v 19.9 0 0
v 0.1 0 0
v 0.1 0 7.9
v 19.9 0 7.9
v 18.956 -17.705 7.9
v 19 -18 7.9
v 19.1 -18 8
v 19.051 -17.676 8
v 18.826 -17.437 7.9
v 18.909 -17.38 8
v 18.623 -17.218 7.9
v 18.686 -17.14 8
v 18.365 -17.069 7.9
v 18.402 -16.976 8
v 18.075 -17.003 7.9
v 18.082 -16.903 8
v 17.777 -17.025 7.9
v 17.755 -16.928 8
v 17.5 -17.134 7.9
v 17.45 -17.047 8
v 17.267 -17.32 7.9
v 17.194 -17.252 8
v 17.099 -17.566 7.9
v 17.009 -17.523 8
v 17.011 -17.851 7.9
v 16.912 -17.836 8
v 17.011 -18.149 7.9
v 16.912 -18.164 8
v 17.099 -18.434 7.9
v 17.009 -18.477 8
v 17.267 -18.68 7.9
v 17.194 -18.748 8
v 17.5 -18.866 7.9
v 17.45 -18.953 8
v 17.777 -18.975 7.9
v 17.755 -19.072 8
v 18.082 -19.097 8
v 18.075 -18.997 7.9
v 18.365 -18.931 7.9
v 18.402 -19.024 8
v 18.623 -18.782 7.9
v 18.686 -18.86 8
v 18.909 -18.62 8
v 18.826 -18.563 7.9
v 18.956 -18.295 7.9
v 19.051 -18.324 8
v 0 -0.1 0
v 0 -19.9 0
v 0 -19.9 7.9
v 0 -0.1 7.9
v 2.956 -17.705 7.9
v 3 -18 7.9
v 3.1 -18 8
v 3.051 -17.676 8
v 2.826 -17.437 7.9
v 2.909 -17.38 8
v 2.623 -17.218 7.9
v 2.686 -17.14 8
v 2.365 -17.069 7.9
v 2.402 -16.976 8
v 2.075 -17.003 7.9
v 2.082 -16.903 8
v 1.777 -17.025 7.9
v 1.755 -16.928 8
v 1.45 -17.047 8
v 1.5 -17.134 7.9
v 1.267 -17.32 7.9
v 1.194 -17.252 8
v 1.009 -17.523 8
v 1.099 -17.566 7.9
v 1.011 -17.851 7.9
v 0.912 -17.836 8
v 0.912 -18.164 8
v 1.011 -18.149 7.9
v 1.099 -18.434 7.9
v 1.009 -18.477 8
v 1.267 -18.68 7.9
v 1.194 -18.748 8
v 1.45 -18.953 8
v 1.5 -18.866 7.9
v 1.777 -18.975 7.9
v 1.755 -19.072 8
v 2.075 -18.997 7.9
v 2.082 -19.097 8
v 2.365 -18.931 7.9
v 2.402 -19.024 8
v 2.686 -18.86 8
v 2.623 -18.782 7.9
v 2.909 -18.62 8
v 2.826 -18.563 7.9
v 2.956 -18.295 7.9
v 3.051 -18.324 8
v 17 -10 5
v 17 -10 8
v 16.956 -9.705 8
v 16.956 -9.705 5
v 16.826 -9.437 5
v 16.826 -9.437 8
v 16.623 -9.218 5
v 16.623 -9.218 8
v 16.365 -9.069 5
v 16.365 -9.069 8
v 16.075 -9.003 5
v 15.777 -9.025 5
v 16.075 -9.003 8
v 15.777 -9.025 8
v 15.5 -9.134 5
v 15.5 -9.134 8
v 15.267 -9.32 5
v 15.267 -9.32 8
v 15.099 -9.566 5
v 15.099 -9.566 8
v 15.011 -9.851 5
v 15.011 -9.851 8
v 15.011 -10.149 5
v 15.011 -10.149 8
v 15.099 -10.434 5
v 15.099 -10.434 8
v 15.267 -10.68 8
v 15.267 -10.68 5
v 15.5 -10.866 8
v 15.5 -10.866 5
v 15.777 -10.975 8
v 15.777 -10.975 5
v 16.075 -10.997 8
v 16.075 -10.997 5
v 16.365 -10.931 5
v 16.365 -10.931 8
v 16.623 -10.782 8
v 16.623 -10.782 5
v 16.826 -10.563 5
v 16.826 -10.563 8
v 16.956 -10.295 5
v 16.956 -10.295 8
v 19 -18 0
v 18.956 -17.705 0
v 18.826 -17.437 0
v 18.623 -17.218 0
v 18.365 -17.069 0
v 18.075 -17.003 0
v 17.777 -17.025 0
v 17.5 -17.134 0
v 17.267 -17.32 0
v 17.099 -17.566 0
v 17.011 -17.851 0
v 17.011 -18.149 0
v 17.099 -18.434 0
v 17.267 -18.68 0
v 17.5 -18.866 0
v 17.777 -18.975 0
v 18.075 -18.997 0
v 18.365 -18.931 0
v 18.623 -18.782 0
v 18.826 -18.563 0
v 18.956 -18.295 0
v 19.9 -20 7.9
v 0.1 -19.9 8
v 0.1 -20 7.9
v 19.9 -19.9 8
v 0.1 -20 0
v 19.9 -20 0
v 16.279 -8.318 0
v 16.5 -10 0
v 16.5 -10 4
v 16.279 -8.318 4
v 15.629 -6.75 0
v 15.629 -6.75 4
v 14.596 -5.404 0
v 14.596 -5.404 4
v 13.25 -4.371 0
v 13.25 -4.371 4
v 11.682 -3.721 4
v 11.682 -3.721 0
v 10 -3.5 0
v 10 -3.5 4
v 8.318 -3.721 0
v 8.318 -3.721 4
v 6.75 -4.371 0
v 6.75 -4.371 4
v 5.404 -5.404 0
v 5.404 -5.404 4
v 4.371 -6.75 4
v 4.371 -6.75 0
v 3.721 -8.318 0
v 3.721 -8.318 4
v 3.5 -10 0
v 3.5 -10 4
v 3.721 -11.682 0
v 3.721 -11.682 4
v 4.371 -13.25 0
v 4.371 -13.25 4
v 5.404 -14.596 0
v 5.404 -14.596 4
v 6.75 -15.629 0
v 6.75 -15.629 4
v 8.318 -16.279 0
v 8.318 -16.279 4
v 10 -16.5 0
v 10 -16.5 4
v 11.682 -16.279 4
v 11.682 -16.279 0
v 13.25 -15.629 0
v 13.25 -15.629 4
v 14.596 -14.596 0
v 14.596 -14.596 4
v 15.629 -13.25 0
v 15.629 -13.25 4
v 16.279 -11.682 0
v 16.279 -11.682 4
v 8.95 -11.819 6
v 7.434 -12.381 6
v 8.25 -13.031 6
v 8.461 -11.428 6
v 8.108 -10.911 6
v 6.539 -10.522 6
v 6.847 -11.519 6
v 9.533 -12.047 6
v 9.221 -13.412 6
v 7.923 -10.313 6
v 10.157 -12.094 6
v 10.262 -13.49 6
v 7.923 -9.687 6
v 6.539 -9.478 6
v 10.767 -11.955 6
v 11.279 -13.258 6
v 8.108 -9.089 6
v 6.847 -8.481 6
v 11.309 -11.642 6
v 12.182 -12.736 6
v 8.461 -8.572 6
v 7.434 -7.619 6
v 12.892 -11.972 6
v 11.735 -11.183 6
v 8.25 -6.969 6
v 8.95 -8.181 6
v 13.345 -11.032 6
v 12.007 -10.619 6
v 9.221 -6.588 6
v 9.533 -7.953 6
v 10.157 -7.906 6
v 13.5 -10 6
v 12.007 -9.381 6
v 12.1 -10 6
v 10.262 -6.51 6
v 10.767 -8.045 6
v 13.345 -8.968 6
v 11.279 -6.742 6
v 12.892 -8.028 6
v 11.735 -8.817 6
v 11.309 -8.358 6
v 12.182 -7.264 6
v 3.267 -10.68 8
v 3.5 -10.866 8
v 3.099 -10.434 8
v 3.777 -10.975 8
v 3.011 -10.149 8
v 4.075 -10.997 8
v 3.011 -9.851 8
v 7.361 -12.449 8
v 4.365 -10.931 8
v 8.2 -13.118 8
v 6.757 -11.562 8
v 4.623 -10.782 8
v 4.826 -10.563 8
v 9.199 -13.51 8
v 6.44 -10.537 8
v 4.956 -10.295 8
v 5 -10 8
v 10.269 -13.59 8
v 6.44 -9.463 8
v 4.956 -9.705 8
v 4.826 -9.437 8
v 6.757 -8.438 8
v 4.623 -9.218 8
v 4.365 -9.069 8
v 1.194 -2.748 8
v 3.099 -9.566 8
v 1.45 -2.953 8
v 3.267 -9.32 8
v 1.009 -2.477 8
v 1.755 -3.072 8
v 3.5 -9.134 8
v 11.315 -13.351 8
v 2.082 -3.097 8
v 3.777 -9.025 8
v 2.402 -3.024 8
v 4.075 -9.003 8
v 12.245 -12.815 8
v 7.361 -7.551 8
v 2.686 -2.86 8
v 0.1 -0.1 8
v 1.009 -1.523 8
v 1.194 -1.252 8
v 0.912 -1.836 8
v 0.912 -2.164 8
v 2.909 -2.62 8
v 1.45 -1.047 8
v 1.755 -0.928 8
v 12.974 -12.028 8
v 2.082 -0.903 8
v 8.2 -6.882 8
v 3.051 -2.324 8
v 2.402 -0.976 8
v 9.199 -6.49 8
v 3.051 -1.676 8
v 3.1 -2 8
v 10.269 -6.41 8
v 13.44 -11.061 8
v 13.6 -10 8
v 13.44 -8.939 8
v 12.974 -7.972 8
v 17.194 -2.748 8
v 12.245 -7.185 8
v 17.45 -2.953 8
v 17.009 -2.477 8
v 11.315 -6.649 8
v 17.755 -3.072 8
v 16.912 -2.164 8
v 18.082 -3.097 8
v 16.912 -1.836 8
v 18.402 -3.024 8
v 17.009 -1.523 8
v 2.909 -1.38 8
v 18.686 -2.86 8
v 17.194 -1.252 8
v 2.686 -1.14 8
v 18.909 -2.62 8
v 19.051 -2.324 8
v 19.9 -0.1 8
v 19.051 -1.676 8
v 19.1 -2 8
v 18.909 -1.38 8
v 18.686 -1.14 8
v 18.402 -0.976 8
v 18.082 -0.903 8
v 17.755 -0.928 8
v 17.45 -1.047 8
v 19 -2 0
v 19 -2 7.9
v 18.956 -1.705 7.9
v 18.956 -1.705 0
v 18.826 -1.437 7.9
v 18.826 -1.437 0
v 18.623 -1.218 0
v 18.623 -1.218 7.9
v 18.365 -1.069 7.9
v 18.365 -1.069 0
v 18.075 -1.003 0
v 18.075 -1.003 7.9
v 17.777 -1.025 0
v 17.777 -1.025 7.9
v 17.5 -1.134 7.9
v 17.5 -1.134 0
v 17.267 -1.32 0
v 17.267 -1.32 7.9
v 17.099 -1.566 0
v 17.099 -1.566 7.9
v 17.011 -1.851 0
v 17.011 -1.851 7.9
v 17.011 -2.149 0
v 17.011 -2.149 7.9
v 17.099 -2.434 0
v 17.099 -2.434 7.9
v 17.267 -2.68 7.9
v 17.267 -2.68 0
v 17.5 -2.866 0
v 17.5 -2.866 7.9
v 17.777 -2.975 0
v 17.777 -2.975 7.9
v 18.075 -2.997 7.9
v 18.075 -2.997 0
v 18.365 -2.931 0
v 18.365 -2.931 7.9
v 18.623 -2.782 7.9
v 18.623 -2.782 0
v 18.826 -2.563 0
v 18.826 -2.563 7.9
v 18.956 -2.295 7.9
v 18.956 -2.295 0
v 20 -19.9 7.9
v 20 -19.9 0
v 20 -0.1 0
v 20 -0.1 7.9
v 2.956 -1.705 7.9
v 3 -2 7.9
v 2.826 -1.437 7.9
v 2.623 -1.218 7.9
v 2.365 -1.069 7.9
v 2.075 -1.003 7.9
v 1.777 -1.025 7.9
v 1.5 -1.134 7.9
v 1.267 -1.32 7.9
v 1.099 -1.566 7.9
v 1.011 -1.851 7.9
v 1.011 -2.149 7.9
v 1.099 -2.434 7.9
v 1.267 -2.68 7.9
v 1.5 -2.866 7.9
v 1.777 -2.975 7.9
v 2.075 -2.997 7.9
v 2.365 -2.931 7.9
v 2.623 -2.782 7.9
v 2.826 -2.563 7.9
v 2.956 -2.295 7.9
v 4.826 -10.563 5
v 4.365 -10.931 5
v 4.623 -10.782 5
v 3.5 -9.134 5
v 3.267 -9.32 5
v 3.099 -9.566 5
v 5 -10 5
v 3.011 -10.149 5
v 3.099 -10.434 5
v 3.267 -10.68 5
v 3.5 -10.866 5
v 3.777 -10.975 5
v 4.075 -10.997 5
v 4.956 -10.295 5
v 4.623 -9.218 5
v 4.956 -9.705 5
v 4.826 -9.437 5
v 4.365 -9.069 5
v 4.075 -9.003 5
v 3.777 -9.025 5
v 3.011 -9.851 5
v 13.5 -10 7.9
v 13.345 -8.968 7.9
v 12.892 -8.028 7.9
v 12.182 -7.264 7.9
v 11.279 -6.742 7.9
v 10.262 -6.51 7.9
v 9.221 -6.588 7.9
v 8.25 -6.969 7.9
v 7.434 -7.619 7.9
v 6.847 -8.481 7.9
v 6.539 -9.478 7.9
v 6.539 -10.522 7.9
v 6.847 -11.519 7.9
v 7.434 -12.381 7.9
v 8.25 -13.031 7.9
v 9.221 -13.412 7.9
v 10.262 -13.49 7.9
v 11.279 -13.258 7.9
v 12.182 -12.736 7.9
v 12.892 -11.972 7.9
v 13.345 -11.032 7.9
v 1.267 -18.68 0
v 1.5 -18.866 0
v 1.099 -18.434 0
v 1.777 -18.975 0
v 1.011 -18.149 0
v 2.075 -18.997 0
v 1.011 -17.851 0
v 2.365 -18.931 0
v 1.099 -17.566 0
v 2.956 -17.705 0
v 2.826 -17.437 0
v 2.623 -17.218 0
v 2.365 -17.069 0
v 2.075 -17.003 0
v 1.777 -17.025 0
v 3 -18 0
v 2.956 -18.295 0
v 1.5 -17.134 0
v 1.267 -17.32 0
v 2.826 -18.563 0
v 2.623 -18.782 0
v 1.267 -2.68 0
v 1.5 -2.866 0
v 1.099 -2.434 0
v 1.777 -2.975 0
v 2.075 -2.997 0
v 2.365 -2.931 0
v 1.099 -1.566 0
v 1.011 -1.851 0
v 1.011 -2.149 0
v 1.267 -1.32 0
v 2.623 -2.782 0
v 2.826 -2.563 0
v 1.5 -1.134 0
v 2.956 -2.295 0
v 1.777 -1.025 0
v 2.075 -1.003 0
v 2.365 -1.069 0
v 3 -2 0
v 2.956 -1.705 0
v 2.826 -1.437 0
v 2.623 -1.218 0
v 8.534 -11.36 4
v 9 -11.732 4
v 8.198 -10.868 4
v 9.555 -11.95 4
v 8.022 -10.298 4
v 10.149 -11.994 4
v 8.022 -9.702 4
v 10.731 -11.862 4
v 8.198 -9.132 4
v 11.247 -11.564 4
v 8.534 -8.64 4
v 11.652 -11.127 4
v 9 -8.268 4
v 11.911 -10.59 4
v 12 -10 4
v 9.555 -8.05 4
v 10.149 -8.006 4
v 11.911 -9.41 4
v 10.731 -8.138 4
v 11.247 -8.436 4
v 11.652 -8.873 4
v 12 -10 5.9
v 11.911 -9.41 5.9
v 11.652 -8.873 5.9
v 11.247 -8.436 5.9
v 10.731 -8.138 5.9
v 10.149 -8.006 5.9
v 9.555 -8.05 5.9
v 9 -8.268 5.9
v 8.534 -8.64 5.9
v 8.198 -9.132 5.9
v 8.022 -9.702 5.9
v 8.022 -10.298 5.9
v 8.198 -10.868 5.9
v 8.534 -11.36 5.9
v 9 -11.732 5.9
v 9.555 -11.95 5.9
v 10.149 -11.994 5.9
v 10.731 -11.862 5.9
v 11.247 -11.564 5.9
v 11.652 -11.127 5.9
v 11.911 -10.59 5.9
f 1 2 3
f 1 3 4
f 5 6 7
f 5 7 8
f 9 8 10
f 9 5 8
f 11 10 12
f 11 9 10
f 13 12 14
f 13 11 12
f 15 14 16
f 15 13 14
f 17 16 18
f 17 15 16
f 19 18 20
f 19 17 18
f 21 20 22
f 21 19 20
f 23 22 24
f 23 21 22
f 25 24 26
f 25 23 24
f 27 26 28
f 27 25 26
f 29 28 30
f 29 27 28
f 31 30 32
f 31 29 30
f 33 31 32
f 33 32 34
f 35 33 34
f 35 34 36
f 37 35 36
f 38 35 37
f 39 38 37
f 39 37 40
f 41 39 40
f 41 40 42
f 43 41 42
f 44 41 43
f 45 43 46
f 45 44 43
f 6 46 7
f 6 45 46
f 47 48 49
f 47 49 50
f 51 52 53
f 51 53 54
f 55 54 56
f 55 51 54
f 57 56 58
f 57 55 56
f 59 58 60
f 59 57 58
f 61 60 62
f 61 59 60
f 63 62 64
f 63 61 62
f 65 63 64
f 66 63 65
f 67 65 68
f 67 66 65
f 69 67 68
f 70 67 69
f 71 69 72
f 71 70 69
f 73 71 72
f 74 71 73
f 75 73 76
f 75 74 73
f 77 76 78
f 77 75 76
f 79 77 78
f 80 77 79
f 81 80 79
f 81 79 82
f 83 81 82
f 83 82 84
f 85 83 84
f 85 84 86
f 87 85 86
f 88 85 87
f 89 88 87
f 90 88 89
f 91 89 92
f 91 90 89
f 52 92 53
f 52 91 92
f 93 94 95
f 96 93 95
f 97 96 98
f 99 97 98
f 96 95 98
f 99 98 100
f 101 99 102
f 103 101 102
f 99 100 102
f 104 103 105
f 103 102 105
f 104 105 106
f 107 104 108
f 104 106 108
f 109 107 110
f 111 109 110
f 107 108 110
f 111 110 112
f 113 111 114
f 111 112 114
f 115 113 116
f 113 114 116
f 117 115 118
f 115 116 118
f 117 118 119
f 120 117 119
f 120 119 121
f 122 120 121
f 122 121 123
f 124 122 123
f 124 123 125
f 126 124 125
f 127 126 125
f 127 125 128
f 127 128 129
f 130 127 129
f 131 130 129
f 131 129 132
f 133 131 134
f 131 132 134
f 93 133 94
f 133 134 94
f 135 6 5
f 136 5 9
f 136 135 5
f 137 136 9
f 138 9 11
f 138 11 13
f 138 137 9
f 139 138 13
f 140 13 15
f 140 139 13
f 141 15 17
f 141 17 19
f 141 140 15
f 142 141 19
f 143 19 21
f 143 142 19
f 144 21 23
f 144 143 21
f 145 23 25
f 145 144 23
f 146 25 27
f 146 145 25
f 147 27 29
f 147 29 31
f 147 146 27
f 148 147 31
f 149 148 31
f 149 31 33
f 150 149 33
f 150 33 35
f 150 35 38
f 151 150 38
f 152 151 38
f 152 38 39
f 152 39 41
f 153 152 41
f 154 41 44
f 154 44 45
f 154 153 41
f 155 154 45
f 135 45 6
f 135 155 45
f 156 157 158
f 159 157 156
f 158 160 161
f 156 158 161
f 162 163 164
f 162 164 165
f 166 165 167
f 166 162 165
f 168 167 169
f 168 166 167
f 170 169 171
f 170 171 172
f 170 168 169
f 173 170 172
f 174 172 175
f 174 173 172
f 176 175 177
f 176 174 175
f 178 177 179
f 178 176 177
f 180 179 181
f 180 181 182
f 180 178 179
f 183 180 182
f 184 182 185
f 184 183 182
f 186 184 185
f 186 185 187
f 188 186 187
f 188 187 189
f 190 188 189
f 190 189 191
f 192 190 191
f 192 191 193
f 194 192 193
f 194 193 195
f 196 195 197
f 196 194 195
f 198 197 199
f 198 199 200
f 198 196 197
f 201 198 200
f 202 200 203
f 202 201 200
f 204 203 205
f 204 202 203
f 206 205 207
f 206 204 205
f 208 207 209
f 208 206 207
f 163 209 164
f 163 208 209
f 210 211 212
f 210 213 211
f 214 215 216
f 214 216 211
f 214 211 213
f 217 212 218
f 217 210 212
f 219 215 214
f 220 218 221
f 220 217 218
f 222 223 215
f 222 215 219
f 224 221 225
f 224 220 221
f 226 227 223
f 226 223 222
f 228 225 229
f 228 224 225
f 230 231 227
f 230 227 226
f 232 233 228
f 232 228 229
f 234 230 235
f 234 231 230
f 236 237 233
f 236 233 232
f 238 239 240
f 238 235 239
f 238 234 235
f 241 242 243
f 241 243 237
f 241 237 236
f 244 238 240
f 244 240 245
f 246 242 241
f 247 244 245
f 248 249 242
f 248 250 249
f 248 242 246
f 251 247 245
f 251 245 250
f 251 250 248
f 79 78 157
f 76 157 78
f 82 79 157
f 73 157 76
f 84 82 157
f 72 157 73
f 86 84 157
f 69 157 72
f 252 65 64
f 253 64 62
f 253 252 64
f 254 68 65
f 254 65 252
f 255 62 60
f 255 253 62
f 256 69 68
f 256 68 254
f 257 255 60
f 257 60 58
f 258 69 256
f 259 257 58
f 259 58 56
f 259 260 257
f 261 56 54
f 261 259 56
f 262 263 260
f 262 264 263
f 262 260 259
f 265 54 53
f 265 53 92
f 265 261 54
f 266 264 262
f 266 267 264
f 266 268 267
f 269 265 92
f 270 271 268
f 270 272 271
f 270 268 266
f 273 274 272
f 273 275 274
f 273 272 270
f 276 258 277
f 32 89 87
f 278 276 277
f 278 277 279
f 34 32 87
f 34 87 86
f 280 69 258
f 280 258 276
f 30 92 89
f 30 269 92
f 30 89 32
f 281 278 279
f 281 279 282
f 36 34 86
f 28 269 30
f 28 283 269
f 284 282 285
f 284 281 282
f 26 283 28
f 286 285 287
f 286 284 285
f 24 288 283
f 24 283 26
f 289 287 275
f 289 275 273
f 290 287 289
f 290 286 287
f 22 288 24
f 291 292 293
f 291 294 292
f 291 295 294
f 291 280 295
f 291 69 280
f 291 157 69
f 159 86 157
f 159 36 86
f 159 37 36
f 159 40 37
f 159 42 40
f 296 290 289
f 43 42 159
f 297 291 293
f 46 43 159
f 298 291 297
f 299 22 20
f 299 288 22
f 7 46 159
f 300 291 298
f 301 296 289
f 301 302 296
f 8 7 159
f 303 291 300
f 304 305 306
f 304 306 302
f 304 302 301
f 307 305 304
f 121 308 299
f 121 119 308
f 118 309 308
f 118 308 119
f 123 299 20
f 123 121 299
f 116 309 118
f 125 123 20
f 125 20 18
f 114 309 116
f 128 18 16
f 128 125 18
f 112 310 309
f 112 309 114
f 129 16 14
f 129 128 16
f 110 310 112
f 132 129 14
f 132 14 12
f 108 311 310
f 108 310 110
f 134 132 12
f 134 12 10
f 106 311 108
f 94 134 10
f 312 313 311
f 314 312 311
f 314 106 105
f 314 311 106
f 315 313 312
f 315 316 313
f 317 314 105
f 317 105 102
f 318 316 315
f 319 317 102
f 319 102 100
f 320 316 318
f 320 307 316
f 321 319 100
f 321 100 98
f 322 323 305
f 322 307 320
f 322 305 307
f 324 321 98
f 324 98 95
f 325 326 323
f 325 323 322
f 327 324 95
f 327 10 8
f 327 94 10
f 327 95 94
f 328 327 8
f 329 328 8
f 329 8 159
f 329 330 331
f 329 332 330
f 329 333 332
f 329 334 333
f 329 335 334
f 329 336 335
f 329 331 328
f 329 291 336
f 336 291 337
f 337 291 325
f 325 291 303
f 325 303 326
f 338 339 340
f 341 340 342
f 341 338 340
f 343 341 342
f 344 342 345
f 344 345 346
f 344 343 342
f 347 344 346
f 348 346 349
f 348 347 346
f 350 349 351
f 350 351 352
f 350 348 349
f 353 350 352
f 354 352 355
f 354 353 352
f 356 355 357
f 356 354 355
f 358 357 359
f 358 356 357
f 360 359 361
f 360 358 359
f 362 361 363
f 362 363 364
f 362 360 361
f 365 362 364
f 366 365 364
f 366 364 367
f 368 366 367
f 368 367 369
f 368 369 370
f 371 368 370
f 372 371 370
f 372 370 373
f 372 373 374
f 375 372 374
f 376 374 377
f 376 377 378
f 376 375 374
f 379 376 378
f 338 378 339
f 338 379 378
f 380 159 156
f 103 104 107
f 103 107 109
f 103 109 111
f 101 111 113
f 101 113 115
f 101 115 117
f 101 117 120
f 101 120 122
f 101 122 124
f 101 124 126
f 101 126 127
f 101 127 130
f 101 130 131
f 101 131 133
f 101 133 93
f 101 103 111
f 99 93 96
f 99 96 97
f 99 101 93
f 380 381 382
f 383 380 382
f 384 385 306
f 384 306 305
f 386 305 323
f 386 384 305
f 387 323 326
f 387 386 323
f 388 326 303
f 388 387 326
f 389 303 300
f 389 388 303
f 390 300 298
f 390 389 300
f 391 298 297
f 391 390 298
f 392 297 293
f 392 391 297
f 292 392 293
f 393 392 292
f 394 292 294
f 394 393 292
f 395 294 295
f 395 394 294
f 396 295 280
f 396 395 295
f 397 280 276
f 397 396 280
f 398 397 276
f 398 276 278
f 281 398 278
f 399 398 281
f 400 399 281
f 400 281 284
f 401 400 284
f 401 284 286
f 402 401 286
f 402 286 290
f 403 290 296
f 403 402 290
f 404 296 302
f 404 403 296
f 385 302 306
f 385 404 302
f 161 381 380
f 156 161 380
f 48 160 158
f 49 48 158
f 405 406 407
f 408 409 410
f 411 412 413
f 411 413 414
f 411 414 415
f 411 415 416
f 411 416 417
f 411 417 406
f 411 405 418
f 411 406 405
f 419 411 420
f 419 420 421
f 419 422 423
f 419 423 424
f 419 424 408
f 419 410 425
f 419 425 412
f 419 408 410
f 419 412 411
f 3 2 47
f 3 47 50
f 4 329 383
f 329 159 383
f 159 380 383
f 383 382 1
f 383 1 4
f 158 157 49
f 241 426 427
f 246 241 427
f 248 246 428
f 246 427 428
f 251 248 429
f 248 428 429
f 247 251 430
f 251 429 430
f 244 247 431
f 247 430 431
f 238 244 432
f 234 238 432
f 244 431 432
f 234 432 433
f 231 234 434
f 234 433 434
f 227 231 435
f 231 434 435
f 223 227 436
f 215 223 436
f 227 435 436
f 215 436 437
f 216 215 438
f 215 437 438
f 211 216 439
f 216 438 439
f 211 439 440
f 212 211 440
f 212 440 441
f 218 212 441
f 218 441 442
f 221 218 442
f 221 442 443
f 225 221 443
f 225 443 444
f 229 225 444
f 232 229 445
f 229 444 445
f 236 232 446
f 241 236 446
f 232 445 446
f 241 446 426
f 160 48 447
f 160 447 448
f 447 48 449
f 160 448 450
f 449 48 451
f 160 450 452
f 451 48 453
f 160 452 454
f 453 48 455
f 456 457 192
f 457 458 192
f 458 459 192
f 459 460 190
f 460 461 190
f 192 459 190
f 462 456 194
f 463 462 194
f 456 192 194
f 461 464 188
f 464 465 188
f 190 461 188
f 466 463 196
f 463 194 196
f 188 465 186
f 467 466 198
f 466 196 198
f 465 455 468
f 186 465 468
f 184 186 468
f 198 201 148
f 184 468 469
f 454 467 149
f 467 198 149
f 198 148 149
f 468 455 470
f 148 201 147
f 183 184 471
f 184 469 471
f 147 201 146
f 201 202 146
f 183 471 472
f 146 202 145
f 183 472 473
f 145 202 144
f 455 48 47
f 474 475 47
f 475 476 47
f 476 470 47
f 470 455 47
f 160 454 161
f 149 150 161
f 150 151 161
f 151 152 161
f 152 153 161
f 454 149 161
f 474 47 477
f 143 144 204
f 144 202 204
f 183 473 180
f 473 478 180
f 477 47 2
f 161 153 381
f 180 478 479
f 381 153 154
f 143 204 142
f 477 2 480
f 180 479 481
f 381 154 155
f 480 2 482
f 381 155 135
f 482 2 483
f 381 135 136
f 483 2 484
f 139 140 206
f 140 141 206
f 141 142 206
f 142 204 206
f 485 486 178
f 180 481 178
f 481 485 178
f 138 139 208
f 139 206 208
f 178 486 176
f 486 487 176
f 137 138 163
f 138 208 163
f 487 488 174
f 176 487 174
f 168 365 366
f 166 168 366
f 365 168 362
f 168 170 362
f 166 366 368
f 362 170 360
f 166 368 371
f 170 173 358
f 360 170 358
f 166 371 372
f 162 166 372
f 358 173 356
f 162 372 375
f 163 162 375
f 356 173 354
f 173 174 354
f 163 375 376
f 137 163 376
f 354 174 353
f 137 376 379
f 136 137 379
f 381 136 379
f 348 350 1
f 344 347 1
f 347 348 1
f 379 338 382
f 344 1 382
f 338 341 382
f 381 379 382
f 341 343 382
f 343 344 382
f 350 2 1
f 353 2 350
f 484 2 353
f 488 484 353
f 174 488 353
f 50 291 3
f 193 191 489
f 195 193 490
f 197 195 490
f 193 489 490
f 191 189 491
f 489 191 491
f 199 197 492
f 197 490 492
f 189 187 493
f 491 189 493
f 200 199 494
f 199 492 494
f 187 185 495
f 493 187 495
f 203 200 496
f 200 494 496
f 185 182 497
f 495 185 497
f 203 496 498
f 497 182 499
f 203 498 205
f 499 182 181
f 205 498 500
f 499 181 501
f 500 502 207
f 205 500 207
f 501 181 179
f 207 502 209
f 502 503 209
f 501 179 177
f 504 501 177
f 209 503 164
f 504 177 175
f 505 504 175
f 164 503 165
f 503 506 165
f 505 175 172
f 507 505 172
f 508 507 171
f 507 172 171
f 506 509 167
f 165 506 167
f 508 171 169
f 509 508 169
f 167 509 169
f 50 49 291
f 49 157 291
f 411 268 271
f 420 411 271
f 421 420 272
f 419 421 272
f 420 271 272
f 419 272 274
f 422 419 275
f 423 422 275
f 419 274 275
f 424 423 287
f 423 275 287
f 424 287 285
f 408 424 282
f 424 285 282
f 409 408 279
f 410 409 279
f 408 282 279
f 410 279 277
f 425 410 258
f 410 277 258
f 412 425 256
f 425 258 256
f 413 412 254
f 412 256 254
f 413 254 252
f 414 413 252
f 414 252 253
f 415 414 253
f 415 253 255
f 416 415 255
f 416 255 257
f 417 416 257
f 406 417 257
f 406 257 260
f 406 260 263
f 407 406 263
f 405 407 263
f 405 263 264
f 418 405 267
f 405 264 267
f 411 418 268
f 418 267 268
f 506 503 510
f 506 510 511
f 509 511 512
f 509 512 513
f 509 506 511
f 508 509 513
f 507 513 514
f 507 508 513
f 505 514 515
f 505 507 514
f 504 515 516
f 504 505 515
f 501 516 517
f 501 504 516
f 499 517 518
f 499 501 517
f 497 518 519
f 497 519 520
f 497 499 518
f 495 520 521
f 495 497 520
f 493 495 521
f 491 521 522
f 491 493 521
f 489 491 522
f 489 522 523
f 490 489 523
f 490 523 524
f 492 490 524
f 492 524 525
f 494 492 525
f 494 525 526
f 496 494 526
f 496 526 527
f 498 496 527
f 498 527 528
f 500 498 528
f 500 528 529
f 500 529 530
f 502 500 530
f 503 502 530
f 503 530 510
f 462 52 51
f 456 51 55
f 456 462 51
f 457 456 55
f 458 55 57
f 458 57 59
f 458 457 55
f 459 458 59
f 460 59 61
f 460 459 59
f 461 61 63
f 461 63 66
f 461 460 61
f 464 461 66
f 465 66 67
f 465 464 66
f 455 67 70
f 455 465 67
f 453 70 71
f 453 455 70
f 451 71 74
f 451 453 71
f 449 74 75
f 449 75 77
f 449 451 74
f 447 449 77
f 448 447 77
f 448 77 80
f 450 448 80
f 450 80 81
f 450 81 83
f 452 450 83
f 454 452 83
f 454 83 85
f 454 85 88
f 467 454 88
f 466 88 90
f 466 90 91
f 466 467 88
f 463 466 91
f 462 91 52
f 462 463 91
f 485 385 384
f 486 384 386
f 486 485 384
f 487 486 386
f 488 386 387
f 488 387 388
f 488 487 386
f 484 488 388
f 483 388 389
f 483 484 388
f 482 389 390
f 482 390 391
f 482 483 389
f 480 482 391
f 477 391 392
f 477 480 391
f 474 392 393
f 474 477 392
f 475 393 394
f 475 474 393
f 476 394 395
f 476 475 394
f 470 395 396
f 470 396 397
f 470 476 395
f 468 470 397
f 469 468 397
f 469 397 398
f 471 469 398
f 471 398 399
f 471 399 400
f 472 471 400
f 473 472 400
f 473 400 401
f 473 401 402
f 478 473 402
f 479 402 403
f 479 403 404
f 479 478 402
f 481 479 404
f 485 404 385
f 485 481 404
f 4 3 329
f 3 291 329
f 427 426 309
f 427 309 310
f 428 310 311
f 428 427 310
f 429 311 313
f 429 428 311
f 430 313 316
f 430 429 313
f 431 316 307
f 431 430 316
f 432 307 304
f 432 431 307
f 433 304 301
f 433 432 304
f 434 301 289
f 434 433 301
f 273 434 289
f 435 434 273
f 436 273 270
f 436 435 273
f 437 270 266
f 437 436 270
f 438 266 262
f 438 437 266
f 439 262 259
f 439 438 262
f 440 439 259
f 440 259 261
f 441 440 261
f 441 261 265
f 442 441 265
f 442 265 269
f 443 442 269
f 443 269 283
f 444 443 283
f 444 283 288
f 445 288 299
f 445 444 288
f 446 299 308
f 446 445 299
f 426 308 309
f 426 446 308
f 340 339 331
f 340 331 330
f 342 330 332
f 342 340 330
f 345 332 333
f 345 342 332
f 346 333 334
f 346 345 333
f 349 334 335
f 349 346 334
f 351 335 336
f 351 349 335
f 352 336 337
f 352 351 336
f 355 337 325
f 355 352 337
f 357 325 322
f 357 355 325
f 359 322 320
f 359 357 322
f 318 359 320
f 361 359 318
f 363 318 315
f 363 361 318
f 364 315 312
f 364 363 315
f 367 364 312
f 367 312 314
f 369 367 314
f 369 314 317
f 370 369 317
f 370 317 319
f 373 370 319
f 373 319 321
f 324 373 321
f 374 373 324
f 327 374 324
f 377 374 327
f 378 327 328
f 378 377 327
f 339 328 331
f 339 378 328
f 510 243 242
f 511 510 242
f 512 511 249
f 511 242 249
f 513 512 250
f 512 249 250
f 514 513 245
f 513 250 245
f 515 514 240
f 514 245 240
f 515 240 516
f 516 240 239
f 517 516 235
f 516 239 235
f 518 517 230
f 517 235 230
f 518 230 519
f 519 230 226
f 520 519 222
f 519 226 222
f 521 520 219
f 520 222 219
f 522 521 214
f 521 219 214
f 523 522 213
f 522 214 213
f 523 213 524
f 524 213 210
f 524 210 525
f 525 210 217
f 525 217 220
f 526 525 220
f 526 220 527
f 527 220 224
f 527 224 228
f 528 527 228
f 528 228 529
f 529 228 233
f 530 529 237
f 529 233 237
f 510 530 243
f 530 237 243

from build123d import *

# Parameters (mm, degrees)
F0_W     = 20
F0_H     = 20
F0_R     = 1
F0_R_2   = 8.5
F0_R_3   = 7
F0_R_4   = 6.5
F0_R_5   = 1.25
F0_R_6   = 2
F1_DEPTH = 8
F2_R     = 3.5
F2_R_2   = 2
F3_DEPTH = 2
F4_SIZE  = 0.1
F5_DEPTH = 4
F6_R     = 1
F7_DEPTH = 3


with BuildPart() as f1:
    # F0 (on Top) → F1 (new body)
    with BuildSketch(Plane.XY):
        with Locations((10, -10)):
            Rectangle(F0_W, F0_H)
        with Locations((2, -18)):
            Circle(F0_R, mode=Mode.SUBTRACT)
        with Locations((18, -18)):
            Circle(F0_R, mode=Mode.SUBTRACT)
        with Locations((2, -2)):
            Circle(F0_R, mode=Mode.SUBTRACT)
        with Locations((10, -10)):
            Circle(F0_R_2, mode=Mode.SUBTRACT)
        with Locations((18, -2)):
            Circle(F0_R, mode=Mode.SUBTRACT)
        with Locations((10, -10)):
            Circle(F0_R_2)
        with Locations((10, -10)):
            Circle(F0_R_3, mode=Mode.SUBTRACT)
        with Locations((10, -10)):
            Circle(F0_R_3)
        with Locations((10, -10)):
            Circle(F0_R_4, mode=Mode.SUBTRACT)
        with Locations((10, -10)):
            Circle(F0_R_4)
        with BuildLine():
            ThreePointArc((11.25, -14.25), (9.1161165153, -15.1338834682), (10.0000000233, -13))
            ThreePointArc((10.0000000233, -13), (10.8838834847, -13.3661165318), (11.25, -14.25))
        make_face(mode=Mode.SUBTRACT)
        with Locations((5.75, -10)):
            Circle(F0_R_5, mode=Mode.SUBTRACT)
        with BuildLine():
            ThreePointArc((10, -7), (12.1213203436, -7.8786796564), (13, -10))
            ThreePointArc((13, -10), (12.1213203518, -12.1213203353), (10.0000000233, -13))
            ThreePointArc((10.0000000233, -13), (7.8786796647, -12.1213203518), (7, -10))
            ThreePointArc((7, -10), (7.8786796564, -7.8786796564), (10, -7))
        make_face(mode=Mode.SUBTRACT)
        with BuildLine():
            ThreePointArc((15.5, -10), (14.25, -11.25), (13, -10))
            ThreePointArc((13, -10), (14.25, -8.75), (15.5, -10))
        make_face(mode=Mode.SUBTRACT)
        with BuildLine():
            ThreePointArc((11.25, -5.75), (10.8838834765, -6.6338834765), (10, -7))
            ThreePointArc((10, -7), (9.1161165235, -4.8661165235), (11.25, -5.75))
        make_face(mode=Mode.SUBTRACT)
        with BuildLine():
            ThreePointArc((10.0000000233, -13), (12.1213203518, -12.1213203353), (13, -10))
            ThreePointArc((13, -10), (12.1213203436, -7.8786796564), (10, -7))
            ThreePointArc((10, -7), (7.8786796564, -7.8786796564), (7, -10))
            ThreePointArc((7, -10), (7.8786796647, -12.1213203518), (10.0000000233, -13))
        make_face()
        with Locations((10, -10)):
            Circle(F0_R_6, mode=Mode.SUBTRACT)
        with BuildLine():
            ThreePointArc((15.5, -10), (14.25, -8.75), (13, -10))
            ThreePointArc((13, -10), (14.25, -11.25), (15.5, -10))
        make_face()
        with BuildLine():
            ThreePointArc((11.25, -5.75), (9.1161165235, -4.8661165235), (10, -7))
            ThreePointArc((10, -7), (10.8838834765, -6.6338834765), (11.25, -5.75))
        make_face()
        with Locations((5.75, -10)):
            Circle(F0_R_5)
        with BuildLine():
            ThreePointArc((11.25, -14.25), (10.8838834847, -13.3661165318), (10.0000000233, -13))
            ThreePointArc((10.0000000233, -13), (9.1161165153, -15.1338834682), (11.25, -14.25))
        make_face()
    extrude(amount=F1_DEPTH)

    # F2 (on face) → F3 (cut)
    with BuildSketch(Plane.XY.offset(8)):
        with Locations((10, -10)):
            Circle(F2_R)
        with Locations((10, -10)):
            Circle(F2_R_2, mode=Mode.SUBTRACT)
    extrude(amount=-F3_DEPTH, mode=Mode.SUBTRACT)

    # F4
    f4_edges = [f1.edges().sort_by_distance(p)[0] for p in [
        (10, 0, 8),
        (20, -10, 8),
        (0, -10, 8),
        (10, -20, 8),
        (1, -18, 8),
        (17, -18, 8),
        (1, -2, 8),
        (6.5, -10, 8),
        (17, -2, 8),
        (20, -20, 4),
        (20, 0, 4),
        (0, -20, 4),
        (0, 0, 4),
        (8, -10, 6),
    ]]
    chamfer(f4_edges, length=F4_SIZE)

    # F0 (on Top) → F5 (cut)
    with BuildSketch(Plane.XY):
        with Locations((10, -10)):
            Circle(F0_R_4)
        with BuildLine():
            ThreePointArc((11.25, -14.25), (9.1161165153, -15.1338834682), (10.0000000233, -13))
            ThreePointArc((10.0000000233, -13), (10.8838834847, -13.3661165318), (11.25, -14.25))
        make_face(mode=Mode.SUBTRACT)
        with Locations((5.75, -10)):
            Circle(F0_R_5, mode=Mode.SUBTRACT)
        with BuildLine():
            ThreePointArc((10, -7), (12.1213203436, -7.8786796564), (13, -10))
            ThreePointArc((13, -10), (12.1213203518, -12.1213203353), (10.0000000233, -13))
            ThreePointArc((10.0000000233, -13), (7.8786796647, -12.1213203518), (7, -10))
            ThreePointArc((7, -10), (7.8786796564, -7.8786796564), (10, -7))
        make_face(mode=Mode.SUBTRACT)
        with BuildLine():
            ThreePointArc((15.5, -10), (14.25, -11.25), (13, -10))
            ThreePointArc((13, -10), (14.25, -8.75), (15.5, -10))
        make_face(mode=Mode.SUBTRACT)
        with BuildLine():
            ThreePointArc((11.25, -5.75), (10.8838834765, -6.6338834765), (10, -7))
            ThreePointArc((10, -7), (9.1161165235, -4.8661165235), (11.25, -5.75))
        make_face(mode=Mode.SUBTRACT)
        with BuildLine():
            ThreePointArc((10.0000000233, -13), (12.1213203518, -12.1213203353), (13, -10))
            ThreePointArc((13, -10), (12.1213203436, -7.8786796564), (10, -7))
            ThreePointArc((10, -7), (7.8786796564, -7.8786796564), (7, -10))
            ThreePointArc((7, -10), (7.8786796647, -12.1213203518), (10.0000000233, -13))
        make_face()
        with Locations((10, -10)):
            Circle(F0_R_6, mode=Mode.SUBTRACT)
        with BuildLine():
            ThreePointArc((15.5, -10), (14.25, -8.75), (13, -10))
            ThreePointArc((13, -10), (14.25, -11.25), (15.5, -10))
        make_face()
        with BuildLine():
            ThreePointArc((11.25, -14.25), (10.8838834847, -13.3661165318), (10.0000000233, -13))
            ThreePointArc((10.0000000233, -13), (9.1161165153, -15.1338834682), (11.25, -14.25))
        make_face()
        with Locations((5.75, -10)):
            Circle(F0_R_5)
        with BuildLine():
            ThreePointArc((11.25, -5.75), (9.1161165235, -4.8661165235), (10, -7))
            ThreePointArc((10, -7), (10.8838834765, -6.6338834765), (11.25, -5.75))
        make_face()
    extrude(amount=F5_DEPTH, mode=Mode.SUBTRACT)

    # F6 (on face) → F7 (cut)
    with BuildSketch(Plane.XY.offset(8)):
        with Locations((4, -10)):
            Circle(F6_R)
        with Locations((16, -10)):
            Circle(F6_R)
    extrude(amount=-F7_DEPTH, mode=Mode.SUBTRACT)


solid = f1.part
